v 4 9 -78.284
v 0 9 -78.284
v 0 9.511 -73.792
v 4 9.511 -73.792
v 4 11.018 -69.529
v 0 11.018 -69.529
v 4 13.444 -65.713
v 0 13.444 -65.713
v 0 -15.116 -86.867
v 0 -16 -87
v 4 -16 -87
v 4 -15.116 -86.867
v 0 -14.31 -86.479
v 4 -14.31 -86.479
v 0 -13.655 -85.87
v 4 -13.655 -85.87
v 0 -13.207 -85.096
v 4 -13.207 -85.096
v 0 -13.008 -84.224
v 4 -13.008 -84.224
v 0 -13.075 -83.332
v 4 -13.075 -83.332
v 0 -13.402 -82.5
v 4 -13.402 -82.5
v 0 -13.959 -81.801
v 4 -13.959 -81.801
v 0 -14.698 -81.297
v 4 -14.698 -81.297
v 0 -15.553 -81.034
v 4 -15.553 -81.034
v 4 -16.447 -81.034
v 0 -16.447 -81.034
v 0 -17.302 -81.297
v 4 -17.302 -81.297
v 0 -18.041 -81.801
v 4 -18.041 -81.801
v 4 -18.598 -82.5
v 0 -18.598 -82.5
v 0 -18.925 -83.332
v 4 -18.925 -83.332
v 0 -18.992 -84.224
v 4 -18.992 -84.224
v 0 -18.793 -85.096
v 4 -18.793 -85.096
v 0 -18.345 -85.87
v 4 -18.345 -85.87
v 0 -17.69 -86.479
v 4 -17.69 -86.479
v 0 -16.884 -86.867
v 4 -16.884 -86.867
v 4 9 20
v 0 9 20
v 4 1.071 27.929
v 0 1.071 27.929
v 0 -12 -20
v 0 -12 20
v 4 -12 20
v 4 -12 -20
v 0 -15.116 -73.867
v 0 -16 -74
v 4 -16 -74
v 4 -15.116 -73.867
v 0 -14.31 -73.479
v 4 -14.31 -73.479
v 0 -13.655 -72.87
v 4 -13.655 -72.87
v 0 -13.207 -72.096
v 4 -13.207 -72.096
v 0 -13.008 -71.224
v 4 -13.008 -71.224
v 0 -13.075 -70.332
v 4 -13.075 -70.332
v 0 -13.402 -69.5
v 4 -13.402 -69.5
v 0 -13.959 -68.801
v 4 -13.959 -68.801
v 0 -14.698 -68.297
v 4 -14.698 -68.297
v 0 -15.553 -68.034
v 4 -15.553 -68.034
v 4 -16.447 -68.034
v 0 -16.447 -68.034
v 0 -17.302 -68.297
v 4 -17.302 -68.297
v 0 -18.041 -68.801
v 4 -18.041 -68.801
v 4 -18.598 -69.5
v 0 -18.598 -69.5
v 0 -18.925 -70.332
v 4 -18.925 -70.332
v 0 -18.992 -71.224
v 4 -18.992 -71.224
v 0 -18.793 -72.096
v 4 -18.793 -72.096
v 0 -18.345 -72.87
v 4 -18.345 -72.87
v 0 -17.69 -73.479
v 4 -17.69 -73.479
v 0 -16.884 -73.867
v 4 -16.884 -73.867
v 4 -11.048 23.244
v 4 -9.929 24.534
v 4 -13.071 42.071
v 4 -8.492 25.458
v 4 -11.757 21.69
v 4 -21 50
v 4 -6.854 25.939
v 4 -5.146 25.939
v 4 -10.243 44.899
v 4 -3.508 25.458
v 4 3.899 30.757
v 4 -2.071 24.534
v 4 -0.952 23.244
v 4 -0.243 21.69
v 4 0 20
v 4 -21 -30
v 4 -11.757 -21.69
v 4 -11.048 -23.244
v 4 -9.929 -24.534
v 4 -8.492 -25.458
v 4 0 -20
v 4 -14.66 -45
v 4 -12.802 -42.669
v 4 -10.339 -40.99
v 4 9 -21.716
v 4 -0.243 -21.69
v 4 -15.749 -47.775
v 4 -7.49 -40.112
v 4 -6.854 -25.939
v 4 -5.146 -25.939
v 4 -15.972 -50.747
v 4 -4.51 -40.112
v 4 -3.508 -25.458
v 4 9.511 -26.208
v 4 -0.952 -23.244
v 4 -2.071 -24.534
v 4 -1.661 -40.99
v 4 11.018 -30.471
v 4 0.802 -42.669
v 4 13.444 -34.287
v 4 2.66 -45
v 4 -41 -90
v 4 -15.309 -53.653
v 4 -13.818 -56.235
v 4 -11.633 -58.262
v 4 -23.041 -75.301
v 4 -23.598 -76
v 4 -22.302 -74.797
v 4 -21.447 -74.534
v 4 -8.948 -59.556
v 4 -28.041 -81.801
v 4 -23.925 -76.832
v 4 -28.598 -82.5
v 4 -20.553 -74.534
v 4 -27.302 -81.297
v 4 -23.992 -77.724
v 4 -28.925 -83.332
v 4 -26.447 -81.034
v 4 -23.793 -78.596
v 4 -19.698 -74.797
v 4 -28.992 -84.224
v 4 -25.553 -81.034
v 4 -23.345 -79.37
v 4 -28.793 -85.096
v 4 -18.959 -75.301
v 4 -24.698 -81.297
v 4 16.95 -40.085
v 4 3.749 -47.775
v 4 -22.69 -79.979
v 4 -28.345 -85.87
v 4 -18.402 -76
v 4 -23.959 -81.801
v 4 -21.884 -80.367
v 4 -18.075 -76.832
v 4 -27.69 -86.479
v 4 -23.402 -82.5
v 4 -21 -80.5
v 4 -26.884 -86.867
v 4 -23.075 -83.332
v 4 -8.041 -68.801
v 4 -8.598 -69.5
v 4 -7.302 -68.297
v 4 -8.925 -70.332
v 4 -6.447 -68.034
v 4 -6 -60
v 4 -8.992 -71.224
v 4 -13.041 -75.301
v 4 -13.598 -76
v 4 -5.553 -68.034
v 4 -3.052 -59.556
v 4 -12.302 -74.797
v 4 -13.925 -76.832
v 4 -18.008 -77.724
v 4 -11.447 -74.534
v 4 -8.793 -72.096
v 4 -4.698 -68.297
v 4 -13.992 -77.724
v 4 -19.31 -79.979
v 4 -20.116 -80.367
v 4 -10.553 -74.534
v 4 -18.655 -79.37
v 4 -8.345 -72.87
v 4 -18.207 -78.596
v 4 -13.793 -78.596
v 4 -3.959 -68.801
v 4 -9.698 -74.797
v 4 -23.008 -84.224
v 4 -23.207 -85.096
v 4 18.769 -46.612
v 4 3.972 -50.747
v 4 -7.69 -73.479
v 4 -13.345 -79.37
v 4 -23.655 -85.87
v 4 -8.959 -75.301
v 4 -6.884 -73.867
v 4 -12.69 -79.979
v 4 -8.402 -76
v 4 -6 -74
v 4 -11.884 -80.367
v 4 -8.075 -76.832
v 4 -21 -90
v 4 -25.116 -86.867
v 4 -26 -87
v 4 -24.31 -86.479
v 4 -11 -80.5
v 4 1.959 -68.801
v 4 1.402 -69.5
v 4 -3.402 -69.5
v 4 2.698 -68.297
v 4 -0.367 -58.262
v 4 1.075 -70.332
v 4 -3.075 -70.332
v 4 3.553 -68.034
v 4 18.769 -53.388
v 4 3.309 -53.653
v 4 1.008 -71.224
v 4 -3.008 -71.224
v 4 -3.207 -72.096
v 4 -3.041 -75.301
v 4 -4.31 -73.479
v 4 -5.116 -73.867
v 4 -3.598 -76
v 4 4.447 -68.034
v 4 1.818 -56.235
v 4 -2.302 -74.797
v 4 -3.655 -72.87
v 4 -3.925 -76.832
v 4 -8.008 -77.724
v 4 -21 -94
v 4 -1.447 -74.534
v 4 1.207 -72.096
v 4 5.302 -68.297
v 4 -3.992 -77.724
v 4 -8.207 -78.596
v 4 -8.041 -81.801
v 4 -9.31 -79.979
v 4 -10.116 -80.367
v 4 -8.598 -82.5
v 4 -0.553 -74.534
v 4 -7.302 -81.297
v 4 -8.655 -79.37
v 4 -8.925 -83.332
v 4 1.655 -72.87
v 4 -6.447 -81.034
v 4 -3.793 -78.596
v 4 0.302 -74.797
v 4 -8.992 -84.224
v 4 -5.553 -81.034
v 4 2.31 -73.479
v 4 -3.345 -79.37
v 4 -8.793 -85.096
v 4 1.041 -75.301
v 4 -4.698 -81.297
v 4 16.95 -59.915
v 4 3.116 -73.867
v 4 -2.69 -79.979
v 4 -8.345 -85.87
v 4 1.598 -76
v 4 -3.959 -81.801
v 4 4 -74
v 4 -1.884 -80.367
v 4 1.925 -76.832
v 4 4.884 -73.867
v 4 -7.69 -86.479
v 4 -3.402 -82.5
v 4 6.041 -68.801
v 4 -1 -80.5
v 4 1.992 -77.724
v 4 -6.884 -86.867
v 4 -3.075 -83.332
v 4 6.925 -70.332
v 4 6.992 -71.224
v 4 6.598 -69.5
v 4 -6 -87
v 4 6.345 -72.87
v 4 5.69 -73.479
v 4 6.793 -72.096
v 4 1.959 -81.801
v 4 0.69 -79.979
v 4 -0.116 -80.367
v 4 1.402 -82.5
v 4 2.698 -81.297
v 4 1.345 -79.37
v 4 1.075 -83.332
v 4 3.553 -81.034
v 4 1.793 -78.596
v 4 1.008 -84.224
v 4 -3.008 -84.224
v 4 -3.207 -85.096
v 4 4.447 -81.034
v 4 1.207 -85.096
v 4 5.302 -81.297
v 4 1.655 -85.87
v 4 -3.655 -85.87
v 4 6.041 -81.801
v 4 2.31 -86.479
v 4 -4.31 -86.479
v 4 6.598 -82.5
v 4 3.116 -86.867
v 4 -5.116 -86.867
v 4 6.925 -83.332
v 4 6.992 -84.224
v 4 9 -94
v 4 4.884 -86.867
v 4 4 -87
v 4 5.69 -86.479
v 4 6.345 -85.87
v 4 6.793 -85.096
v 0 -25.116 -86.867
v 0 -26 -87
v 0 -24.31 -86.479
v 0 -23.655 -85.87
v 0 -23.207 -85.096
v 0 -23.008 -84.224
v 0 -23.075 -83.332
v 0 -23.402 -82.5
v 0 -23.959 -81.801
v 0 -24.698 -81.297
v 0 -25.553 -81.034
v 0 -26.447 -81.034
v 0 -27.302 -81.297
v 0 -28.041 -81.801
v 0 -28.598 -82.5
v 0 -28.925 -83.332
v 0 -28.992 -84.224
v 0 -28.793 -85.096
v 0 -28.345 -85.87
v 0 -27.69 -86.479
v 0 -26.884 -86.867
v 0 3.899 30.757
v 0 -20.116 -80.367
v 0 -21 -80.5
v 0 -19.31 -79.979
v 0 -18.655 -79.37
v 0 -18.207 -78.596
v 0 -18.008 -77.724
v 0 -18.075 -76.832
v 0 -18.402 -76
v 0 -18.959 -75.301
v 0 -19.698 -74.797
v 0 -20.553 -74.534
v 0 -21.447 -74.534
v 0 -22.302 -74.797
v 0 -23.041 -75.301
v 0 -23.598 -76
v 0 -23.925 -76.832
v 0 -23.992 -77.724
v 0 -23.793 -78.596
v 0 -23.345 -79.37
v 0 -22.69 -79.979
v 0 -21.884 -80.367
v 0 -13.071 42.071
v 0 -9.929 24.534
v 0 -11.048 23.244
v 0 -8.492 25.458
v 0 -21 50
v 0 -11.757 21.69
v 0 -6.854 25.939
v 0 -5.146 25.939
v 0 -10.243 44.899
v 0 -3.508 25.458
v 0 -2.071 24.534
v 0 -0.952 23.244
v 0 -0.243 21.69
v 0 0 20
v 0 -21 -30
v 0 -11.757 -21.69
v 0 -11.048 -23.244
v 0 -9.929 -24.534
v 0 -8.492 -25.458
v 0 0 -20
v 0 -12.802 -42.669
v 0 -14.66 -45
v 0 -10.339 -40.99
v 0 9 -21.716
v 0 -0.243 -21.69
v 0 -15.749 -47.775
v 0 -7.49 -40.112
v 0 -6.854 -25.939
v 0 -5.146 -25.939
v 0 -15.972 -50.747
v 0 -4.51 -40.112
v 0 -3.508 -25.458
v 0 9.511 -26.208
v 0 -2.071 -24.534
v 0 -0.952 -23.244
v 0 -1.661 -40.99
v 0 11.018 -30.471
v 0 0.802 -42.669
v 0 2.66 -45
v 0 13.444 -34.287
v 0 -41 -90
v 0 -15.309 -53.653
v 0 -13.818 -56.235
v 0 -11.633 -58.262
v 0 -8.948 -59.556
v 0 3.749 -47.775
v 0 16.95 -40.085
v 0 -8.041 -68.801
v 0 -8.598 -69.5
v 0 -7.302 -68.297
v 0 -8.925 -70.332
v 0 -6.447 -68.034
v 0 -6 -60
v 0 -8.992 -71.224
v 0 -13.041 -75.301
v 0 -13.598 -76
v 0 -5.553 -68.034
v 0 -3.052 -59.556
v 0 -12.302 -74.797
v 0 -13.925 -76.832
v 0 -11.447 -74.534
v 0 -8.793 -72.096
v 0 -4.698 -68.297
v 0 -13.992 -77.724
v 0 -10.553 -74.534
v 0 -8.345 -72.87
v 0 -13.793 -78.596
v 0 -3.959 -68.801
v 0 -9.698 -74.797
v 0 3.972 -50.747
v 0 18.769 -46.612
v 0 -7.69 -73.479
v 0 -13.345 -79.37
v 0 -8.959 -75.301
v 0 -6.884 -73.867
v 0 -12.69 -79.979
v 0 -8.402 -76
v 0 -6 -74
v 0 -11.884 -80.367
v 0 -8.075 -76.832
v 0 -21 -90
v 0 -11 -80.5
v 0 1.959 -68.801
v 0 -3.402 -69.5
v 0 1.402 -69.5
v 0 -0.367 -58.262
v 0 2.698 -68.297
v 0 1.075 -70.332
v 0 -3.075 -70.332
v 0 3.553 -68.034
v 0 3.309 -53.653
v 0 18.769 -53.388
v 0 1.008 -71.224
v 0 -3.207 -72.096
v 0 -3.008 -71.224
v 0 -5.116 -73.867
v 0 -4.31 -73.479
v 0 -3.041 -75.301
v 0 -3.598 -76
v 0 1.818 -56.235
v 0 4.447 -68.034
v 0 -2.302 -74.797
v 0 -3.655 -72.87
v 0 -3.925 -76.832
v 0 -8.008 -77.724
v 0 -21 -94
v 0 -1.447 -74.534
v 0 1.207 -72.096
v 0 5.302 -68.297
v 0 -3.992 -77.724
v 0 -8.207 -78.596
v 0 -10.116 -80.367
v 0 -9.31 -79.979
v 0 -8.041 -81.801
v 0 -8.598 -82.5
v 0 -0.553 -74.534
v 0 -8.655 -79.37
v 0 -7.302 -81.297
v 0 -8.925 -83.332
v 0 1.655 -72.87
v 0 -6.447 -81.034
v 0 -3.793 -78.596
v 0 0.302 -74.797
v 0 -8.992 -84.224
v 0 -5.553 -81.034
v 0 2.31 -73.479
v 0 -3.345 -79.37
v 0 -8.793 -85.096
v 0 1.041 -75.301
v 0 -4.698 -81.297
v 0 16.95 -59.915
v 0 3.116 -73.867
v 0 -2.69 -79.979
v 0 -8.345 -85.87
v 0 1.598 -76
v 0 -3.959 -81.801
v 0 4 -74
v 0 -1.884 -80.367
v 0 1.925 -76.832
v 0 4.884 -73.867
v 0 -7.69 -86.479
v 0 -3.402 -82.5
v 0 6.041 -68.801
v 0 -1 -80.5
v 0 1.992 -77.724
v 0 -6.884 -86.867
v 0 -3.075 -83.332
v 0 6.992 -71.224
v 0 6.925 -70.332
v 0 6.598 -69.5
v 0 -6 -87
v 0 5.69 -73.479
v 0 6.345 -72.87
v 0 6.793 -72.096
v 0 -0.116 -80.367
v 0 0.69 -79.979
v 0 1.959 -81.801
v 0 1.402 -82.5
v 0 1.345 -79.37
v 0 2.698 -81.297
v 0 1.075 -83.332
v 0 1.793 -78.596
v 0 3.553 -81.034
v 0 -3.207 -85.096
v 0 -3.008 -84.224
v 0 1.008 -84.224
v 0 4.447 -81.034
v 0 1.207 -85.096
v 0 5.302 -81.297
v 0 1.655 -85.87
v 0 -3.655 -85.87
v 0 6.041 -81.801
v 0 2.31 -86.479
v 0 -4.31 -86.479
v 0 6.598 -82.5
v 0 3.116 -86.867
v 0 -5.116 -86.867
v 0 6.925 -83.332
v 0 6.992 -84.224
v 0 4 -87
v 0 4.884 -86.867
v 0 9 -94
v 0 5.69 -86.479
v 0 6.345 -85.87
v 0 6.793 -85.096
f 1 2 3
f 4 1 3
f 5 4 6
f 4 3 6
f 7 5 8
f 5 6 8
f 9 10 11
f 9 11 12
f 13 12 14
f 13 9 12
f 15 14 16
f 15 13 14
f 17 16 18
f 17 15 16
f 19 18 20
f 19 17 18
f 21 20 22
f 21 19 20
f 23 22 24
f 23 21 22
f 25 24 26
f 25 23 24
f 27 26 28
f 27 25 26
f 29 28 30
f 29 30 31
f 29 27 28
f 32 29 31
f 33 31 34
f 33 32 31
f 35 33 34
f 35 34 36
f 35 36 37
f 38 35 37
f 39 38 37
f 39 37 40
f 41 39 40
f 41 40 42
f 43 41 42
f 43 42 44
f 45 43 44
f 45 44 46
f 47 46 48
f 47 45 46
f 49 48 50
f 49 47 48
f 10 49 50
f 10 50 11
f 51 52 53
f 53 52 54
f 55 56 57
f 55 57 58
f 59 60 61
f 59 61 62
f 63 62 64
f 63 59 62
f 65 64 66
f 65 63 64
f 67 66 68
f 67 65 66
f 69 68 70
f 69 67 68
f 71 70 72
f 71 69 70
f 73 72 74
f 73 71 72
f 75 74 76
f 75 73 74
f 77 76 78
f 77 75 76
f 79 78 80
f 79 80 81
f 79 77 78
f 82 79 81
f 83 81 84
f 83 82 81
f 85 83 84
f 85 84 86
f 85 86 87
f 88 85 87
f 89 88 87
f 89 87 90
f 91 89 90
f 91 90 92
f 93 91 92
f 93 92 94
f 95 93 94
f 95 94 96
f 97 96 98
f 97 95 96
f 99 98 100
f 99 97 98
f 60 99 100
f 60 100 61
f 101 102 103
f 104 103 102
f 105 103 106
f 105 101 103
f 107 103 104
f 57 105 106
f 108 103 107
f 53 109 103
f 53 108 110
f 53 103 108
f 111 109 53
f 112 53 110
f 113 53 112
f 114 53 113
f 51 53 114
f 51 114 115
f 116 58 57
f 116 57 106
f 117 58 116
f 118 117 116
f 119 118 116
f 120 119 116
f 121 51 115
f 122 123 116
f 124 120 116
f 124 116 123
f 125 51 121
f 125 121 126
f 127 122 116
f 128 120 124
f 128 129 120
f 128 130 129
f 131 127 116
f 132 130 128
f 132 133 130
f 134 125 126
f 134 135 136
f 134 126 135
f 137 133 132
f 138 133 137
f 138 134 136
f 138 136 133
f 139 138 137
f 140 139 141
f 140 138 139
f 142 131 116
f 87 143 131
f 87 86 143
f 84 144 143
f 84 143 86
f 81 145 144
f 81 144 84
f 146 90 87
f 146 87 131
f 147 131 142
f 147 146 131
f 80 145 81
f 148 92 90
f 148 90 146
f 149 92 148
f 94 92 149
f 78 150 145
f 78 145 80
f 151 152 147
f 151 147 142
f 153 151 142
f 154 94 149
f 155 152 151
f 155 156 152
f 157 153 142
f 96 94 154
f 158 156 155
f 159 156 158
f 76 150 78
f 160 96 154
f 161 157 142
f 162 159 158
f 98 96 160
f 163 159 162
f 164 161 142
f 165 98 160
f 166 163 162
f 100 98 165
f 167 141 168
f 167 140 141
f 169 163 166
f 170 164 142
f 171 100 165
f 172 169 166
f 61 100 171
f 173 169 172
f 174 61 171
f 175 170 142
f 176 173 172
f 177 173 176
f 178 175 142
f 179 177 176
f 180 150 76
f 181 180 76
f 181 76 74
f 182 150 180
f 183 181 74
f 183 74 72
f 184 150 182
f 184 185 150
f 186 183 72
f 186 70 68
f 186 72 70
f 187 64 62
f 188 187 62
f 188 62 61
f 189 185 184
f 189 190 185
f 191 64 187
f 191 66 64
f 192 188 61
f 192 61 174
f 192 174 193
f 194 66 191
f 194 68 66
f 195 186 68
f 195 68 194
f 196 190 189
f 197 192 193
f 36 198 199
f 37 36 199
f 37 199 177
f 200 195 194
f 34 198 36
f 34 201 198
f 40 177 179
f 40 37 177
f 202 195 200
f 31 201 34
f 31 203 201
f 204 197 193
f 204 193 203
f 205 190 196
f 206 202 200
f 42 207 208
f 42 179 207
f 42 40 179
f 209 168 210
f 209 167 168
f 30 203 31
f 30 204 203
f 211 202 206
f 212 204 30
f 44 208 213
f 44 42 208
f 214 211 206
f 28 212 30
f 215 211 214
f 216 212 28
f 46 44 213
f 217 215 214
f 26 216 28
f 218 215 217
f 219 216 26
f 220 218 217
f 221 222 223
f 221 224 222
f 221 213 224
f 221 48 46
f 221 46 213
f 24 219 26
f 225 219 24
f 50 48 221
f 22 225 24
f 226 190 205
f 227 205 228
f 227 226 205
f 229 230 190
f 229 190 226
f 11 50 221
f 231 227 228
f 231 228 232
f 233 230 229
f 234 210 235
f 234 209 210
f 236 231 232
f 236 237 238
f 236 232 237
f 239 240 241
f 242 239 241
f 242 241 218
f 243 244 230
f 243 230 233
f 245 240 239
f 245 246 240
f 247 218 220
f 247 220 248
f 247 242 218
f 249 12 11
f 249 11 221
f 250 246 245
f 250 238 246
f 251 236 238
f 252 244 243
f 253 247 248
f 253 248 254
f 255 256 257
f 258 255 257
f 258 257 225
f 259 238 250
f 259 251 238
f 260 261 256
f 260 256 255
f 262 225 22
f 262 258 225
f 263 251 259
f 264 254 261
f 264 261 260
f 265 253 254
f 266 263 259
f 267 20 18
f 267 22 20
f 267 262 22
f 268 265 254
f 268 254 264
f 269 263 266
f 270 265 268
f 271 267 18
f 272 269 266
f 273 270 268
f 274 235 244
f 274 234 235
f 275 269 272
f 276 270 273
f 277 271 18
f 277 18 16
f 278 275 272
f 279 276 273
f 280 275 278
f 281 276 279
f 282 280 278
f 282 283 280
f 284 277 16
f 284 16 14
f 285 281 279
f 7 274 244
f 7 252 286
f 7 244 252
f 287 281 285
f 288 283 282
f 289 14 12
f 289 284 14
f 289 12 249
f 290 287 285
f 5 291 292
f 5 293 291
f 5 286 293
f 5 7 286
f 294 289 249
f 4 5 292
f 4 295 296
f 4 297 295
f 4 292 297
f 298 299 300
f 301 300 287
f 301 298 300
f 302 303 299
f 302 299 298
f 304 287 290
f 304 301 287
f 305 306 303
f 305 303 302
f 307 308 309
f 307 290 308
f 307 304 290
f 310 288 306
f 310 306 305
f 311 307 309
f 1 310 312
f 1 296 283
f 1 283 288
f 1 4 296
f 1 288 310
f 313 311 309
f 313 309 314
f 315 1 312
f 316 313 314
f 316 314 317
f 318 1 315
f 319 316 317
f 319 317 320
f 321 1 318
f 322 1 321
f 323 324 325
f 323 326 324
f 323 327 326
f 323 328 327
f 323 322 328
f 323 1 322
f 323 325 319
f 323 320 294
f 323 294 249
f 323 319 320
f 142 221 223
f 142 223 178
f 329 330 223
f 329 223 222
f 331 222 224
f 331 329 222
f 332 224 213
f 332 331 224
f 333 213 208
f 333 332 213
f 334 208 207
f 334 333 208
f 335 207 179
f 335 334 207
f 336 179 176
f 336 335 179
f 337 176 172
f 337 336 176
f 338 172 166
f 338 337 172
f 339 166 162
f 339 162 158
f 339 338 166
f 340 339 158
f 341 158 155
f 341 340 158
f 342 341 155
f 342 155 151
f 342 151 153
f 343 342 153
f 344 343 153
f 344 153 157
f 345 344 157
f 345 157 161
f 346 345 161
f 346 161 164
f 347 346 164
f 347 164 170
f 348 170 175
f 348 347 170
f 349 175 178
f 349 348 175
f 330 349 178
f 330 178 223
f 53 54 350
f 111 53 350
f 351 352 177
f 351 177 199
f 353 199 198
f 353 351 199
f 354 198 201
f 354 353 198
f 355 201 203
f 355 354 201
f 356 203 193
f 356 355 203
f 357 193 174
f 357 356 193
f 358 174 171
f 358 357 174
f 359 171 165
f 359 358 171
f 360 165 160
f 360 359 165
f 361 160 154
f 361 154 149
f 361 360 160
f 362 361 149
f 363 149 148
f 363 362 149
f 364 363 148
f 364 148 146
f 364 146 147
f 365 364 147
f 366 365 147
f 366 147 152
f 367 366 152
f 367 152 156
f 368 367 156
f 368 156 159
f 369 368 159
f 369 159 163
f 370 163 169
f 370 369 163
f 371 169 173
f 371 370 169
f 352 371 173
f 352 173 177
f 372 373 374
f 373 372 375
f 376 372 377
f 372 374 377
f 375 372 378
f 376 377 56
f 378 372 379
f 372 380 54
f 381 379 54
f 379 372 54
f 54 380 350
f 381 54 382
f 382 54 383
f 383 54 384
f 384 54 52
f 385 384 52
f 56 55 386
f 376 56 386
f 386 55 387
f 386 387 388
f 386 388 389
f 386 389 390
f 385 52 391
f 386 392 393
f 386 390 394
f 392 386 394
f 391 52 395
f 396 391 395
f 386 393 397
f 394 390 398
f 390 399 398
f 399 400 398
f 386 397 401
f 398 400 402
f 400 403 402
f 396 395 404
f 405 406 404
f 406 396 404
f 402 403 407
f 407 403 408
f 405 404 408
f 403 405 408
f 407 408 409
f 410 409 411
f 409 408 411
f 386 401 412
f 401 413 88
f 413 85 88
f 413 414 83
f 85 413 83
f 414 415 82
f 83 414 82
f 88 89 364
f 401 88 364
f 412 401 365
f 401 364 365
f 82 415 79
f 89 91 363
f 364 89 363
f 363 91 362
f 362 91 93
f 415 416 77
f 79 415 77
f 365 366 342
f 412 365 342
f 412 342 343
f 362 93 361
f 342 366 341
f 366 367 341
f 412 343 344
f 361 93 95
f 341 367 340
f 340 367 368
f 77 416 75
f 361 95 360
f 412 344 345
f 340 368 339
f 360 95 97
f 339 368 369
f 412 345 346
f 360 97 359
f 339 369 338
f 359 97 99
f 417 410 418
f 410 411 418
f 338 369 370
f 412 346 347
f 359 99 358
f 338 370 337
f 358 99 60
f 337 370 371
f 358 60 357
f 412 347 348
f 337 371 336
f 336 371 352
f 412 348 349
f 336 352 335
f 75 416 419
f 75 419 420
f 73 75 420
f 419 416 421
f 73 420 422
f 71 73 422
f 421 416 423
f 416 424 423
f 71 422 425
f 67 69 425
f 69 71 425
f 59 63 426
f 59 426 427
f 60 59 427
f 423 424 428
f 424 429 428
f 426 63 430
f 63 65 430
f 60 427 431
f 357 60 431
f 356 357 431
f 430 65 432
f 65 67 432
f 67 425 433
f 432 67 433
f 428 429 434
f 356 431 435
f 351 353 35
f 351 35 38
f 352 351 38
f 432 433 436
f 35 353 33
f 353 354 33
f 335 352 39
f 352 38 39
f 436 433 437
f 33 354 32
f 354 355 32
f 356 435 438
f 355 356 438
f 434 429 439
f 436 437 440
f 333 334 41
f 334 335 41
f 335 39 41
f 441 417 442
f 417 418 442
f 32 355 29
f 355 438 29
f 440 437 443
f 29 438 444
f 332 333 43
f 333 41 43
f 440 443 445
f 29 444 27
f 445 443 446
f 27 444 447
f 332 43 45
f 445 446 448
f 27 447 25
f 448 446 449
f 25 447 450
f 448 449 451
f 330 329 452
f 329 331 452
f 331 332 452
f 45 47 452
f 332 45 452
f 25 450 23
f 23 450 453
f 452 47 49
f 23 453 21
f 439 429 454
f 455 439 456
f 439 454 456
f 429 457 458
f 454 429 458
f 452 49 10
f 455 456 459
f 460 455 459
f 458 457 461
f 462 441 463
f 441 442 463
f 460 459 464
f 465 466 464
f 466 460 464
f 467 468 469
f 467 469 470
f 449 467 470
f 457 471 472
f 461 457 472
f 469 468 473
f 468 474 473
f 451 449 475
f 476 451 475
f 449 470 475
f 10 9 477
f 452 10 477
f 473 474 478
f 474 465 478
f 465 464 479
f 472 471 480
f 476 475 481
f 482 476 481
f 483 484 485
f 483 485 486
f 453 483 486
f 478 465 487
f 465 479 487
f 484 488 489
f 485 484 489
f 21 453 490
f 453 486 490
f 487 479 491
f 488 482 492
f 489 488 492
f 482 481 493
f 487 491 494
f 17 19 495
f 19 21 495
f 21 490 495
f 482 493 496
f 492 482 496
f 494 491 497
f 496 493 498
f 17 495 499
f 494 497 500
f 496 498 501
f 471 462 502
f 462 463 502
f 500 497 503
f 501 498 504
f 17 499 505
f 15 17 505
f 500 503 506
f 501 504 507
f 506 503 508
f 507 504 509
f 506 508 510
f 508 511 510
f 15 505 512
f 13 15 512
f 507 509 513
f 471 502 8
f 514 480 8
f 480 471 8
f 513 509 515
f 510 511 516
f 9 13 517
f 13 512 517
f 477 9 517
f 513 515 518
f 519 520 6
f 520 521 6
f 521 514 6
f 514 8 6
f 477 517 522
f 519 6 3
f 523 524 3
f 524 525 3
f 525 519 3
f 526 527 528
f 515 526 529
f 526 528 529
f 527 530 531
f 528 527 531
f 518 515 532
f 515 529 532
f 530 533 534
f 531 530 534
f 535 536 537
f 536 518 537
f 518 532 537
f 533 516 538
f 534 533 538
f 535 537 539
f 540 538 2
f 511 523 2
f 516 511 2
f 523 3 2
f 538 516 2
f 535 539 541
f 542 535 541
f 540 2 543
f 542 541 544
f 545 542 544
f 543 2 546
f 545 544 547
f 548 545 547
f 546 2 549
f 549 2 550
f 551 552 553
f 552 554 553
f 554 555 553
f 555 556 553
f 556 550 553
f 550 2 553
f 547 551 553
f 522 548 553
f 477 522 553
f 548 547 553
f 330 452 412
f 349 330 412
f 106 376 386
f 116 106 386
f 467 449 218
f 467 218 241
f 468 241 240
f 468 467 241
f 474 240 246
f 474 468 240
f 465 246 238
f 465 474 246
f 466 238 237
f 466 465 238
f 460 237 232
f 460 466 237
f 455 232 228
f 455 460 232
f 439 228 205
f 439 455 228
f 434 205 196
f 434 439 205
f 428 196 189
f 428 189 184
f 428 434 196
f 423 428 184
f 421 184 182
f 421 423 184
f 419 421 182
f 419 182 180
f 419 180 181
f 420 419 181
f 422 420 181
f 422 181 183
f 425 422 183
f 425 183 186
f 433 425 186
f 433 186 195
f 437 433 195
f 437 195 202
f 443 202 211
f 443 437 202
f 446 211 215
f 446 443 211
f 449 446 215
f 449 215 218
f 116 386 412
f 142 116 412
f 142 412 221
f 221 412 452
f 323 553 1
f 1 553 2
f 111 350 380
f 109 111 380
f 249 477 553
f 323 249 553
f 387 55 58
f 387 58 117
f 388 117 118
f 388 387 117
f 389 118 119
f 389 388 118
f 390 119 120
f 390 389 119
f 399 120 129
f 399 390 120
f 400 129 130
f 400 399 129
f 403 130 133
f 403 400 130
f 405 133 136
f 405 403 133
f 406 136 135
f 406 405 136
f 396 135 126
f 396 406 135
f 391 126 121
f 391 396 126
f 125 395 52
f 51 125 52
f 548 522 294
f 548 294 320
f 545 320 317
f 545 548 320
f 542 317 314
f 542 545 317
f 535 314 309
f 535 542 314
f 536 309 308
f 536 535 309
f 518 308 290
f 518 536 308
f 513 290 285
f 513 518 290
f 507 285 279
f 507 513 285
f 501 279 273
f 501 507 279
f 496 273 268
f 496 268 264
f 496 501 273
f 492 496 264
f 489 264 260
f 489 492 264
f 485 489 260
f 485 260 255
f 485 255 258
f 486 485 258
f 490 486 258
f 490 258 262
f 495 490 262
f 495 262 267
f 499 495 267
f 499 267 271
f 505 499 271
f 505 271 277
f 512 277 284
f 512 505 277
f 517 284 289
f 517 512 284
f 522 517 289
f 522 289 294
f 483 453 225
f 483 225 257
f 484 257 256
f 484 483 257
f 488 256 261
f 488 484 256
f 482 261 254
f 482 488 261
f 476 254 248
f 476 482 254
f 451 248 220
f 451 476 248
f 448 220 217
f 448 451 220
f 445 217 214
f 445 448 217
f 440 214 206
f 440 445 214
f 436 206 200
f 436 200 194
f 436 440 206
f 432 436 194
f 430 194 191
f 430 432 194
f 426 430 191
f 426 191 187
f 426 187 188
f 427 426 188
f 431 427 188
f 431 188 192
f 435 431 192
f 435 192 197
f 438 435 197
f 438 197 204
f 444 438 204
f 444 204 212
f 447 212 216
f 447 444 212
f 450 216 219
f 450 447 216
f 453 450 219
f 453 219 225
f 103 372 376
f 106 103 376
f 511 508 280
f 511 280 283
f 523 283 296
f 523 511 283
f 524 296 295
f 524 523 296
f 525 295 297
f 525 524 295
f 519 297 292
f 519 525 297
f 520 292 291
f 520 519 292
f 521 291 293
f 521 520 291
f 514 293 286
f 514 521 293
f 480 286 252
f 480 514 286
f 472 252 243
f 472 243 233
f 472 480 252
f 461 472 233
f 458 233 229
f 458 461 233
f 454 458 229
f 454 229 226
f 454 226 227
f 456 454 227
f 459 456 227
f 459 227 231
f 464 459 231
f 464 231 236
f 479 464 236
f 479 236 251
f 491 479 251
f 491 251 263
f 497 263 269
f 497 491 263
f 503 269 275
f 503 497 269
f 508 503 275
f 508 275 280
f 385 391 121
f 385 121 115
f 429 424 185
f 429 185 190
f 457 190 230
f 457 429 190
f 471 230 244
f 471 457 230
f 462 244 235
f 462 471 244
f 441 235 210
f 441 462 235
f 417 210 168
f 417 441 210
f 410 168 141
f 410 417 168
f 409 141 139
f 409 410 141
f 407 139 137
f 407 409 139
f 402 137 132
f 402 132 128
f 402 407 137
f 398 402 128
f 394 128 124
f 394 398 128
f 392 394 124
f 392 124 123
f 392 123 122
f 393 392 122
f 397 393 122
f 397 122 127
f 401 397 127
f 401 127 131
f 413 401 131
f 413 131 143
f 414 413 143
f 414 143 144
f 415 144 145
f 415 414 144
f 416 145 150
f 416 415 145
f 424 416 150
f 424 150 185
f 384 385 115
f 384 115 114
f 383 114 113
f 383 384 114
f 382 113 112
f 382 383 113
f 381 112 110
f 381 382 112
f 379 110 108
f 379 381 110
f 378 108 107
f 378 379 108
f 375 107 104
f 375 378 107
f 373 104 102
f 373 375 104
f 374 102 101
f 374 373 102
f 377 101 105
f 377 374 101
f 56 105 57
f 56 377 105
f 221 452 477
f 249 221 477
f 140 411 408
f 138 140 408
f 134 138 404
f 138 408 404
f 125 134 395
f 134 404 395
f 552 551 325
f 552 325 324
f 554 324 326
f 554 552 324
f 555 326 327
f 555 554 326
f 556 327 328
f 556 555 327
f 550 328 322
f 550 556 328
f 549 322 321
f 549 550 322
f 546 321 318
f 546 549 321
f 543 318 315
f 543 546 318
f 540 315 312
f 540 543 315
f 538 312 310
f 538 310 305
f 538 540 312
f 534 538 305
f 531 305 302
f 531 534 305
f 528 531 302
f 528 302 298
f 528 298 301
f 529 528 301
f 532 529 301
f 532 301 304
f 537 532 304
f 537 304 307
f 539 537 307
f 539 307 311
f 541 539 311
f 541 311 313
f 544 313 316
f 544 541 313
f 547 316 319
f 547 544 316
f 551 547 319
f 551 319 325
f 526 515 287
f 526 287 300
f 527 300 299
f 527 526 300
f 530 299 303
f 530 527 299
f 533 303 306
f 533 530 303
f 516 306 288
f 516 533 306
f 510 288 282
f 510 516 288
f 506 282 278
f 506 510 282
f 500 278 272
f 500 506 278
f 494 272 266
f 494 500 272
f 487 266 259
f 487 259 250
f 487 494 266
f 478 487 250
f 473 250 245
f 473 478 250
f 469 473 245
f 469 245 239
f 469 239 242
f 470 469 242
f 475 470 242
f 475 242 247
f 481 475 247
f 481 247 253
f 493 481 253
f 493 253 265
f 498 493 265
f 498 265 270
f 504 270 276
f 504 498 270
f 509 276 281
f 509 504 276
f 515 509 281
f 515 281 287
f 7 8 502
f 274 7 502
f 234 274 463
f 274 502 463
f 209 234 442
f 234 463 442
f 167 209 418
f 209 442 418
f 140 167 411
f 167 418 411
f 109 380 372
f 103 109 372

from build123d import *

# Parameters (mm, degrees)
SKETCH2_R               = 10
SKETCH2_R_2             = 3
BOSS_EXTRUDE1_DEPTH     = 4
CUT_EXTRUDE3_DEPTH      = 128.285567155
CUT_EXTRUDE3_DEPTH_BACK = 128.285567155


with BuildPart() as part:
    # Sketch2 → Boss-Extrude1 (new body)
    with BuildSketch(Plane(origin=(0, 0, 0), x_dir=(0, 0, -1), z_dir=(1, 0, 0))):
        with BuildLine():
            Line((119, 9), (119, 44.995728753))
            Line((119, 44.995728753), (94, 44.995728753))
            Line((94, 44.995728753), (94, 24.715728753))
            ThreePointArc((94, 24.715728753), (89.39696962, 13.60303038), (78.284271247, 9))
            ThreePointArc((78.284271247, 9), (71.617604581, 10.143819168), (65.713484026, 13.444444444))
            ThreePointArc((65.713484026, 13.444444444), (50, 19), (34.286515974, 13.444444444))
            ThreePointArc((34.286515974, 13.444444444), (28.382395419, 10.143819168), (21.715728753, 9))
            Line((21.715728753, 9), (-20, 9))
            Line((-20, 9), (-27.928932188, 1.071067812))
            Line((-27.928932188, 1.071067812), (-30.757359313, 3.899494937))
            Line((-30.757359313, 3.899494937), (-44.899494937, -10.242640687))
            Line((-44.899494937, -10.242640687), (-42.071067812, -13.071067812))
            Line((-42.071067812, -13.071067812), (-50, -21))
            Line((-50, -21), (18.196601125, -21))
            Line((18.196601125, -21), (30, -21))
            Line((30, -21), (90, -41))
            Line((90, -41), (90, -21))
            Line((90, -21), (94, -21))
            Line((94, -21), (94, -41))
            Line((94, -41), (119, 9))
        make_face()
        with Locations((50, -6)):
            Circle(SKETCH2_R, mode=Mode.SUBTRACT)
        with Locations((106.5, -6)):
            Circle(SKETCH2_R_2, mode=Mode.SUBTRACT)
        with Locations((106.5, 4)):
            Circle(SKETCH2_R_2, mode=Mode.SUBTRACT)
        with Locations((113, 9)):
            Circle(SKETCH2_R_2, mode=Mode.SUBTRACT)
        with Locations((106.5, 14)):
            Circle(SKETCH2_R_2, mode=Mode.SUBTRACT)
        with Locations((113, 19)):
            Circle(SKETCH2_R_2, mode=Mode.SUBTRACT)
        with Locations((106.5, 24)):
            Circle(SKETCH2_R_2, mode=Mode.SUBTRACT)
        with Locations((113, 29)):
            Circle(SKETCH2_R_2, mode=Mode.SUBTRACT)
        with Locations((113, 39)):
            Circle(SKETCH2_R_2, mode=Mode.SUBTRACT)
        with Locations((106.5, 34)):
            Circle(SKETCH2_R_2, mode=Mode.SUBTRACT)
        with Locations((100, 39)):
            Circle(SKETCH2_R_2, mode=Mode.SUBTRACT)
        with Locations((100, 29)):
            Circle(SKETCH2_R_2, mode=Mode.SUBTRACT)
        with Locations((100, 19)):
            Circle(SKETCH2_R_2, mode=Mode.SUBTRACT)
        with Locations((100, 9)):
            Circle(SKETCH2_R_2, mode=Mode.SUBTRACT)
        with Locations((100, -1)):
            Circle(SKETCH2_R_2, mode=Mode.SUBTRACT)
        with Locations((100, -11)):
            Circle(SKETCH2_R_2, mode=Mode.SUBTRACT)
        with Locations((84, 4)):
            Circle(SKETCH2_R_2, mode=Mode.SUBTRACT)
        with Locations((71, 4)):
            Circle(SKETCH2_R_2, mode=Mode.SUBTRACT)
        with Locations((77.5, -1)):
            Circle(SKETCH2_R_2, mode=Mode.SUBTRACT)
        with Locations((84, -6)):
            Circle(SKETCH2_R_2, mode=Mode.SUBTRACT)
        with Locations((84, -16)):
            Circle(SKETCH2_R_2, mode=Mode.SUBTRACT)
        with Locations((77.5, -11)):
            Circle(SKETCH2_R_2, mode=Mode.SUBTRACT)
        with Locations((71, -6)):
            Circle(SKETCH2_R_2, mode=Mode.SUBTRACT)
        with Locations((71, -16)):
            Circle(SKETCH2_R_2, mode=Mode.SUBTRACT)
        with Locations((84, -26)):
            Circle(SKETCH2_R_2, mode=Mode.SUBTRACT)
        with Locations((77.5, -21)):
            Circle(SKETCH2_R_2, mode=Mode.SUBTRACT)
        with BuildLine():
            Line((20, 0), (-20, 0))
            ThreePointArc((-20, 0), (-26, -6), (-20, -12))
            Line((-20, -12), (20, -12))
            ThreePointArc((20, -12), (26, -6), (20, 0))
        make_face(mode=Mode.SUBTRACT)
    extrude(amount=BOSS_EXTRUDE1_DEPTH)

    # Sketch3 → Cut-Extrude3 (cut, two sides: drawn at the far end of the back side and taken through both)
    with BuildSketch(Plane(origin=(0, 0, 0), x_dir=(0, 0, -1), z_dir=(1, 0, 0)).offset(-CUT_EXTRUDE3_DEPTH_BACK)):
        Polygon((94, -21), (94, 9), (78.284271247, 9), (78.284271247, 52.431858837), (131.189267146, 52.431858837), (131.189267146, -47.367568871), (90.840116585, -47.367568871), align=None)
    extrude(amount=CUT_EXTRUDE3_DEPTH + CUT_EXTRUDE3_DEPTH_BACK, mode=Mode.SUBTRACT)


solid = part.part
